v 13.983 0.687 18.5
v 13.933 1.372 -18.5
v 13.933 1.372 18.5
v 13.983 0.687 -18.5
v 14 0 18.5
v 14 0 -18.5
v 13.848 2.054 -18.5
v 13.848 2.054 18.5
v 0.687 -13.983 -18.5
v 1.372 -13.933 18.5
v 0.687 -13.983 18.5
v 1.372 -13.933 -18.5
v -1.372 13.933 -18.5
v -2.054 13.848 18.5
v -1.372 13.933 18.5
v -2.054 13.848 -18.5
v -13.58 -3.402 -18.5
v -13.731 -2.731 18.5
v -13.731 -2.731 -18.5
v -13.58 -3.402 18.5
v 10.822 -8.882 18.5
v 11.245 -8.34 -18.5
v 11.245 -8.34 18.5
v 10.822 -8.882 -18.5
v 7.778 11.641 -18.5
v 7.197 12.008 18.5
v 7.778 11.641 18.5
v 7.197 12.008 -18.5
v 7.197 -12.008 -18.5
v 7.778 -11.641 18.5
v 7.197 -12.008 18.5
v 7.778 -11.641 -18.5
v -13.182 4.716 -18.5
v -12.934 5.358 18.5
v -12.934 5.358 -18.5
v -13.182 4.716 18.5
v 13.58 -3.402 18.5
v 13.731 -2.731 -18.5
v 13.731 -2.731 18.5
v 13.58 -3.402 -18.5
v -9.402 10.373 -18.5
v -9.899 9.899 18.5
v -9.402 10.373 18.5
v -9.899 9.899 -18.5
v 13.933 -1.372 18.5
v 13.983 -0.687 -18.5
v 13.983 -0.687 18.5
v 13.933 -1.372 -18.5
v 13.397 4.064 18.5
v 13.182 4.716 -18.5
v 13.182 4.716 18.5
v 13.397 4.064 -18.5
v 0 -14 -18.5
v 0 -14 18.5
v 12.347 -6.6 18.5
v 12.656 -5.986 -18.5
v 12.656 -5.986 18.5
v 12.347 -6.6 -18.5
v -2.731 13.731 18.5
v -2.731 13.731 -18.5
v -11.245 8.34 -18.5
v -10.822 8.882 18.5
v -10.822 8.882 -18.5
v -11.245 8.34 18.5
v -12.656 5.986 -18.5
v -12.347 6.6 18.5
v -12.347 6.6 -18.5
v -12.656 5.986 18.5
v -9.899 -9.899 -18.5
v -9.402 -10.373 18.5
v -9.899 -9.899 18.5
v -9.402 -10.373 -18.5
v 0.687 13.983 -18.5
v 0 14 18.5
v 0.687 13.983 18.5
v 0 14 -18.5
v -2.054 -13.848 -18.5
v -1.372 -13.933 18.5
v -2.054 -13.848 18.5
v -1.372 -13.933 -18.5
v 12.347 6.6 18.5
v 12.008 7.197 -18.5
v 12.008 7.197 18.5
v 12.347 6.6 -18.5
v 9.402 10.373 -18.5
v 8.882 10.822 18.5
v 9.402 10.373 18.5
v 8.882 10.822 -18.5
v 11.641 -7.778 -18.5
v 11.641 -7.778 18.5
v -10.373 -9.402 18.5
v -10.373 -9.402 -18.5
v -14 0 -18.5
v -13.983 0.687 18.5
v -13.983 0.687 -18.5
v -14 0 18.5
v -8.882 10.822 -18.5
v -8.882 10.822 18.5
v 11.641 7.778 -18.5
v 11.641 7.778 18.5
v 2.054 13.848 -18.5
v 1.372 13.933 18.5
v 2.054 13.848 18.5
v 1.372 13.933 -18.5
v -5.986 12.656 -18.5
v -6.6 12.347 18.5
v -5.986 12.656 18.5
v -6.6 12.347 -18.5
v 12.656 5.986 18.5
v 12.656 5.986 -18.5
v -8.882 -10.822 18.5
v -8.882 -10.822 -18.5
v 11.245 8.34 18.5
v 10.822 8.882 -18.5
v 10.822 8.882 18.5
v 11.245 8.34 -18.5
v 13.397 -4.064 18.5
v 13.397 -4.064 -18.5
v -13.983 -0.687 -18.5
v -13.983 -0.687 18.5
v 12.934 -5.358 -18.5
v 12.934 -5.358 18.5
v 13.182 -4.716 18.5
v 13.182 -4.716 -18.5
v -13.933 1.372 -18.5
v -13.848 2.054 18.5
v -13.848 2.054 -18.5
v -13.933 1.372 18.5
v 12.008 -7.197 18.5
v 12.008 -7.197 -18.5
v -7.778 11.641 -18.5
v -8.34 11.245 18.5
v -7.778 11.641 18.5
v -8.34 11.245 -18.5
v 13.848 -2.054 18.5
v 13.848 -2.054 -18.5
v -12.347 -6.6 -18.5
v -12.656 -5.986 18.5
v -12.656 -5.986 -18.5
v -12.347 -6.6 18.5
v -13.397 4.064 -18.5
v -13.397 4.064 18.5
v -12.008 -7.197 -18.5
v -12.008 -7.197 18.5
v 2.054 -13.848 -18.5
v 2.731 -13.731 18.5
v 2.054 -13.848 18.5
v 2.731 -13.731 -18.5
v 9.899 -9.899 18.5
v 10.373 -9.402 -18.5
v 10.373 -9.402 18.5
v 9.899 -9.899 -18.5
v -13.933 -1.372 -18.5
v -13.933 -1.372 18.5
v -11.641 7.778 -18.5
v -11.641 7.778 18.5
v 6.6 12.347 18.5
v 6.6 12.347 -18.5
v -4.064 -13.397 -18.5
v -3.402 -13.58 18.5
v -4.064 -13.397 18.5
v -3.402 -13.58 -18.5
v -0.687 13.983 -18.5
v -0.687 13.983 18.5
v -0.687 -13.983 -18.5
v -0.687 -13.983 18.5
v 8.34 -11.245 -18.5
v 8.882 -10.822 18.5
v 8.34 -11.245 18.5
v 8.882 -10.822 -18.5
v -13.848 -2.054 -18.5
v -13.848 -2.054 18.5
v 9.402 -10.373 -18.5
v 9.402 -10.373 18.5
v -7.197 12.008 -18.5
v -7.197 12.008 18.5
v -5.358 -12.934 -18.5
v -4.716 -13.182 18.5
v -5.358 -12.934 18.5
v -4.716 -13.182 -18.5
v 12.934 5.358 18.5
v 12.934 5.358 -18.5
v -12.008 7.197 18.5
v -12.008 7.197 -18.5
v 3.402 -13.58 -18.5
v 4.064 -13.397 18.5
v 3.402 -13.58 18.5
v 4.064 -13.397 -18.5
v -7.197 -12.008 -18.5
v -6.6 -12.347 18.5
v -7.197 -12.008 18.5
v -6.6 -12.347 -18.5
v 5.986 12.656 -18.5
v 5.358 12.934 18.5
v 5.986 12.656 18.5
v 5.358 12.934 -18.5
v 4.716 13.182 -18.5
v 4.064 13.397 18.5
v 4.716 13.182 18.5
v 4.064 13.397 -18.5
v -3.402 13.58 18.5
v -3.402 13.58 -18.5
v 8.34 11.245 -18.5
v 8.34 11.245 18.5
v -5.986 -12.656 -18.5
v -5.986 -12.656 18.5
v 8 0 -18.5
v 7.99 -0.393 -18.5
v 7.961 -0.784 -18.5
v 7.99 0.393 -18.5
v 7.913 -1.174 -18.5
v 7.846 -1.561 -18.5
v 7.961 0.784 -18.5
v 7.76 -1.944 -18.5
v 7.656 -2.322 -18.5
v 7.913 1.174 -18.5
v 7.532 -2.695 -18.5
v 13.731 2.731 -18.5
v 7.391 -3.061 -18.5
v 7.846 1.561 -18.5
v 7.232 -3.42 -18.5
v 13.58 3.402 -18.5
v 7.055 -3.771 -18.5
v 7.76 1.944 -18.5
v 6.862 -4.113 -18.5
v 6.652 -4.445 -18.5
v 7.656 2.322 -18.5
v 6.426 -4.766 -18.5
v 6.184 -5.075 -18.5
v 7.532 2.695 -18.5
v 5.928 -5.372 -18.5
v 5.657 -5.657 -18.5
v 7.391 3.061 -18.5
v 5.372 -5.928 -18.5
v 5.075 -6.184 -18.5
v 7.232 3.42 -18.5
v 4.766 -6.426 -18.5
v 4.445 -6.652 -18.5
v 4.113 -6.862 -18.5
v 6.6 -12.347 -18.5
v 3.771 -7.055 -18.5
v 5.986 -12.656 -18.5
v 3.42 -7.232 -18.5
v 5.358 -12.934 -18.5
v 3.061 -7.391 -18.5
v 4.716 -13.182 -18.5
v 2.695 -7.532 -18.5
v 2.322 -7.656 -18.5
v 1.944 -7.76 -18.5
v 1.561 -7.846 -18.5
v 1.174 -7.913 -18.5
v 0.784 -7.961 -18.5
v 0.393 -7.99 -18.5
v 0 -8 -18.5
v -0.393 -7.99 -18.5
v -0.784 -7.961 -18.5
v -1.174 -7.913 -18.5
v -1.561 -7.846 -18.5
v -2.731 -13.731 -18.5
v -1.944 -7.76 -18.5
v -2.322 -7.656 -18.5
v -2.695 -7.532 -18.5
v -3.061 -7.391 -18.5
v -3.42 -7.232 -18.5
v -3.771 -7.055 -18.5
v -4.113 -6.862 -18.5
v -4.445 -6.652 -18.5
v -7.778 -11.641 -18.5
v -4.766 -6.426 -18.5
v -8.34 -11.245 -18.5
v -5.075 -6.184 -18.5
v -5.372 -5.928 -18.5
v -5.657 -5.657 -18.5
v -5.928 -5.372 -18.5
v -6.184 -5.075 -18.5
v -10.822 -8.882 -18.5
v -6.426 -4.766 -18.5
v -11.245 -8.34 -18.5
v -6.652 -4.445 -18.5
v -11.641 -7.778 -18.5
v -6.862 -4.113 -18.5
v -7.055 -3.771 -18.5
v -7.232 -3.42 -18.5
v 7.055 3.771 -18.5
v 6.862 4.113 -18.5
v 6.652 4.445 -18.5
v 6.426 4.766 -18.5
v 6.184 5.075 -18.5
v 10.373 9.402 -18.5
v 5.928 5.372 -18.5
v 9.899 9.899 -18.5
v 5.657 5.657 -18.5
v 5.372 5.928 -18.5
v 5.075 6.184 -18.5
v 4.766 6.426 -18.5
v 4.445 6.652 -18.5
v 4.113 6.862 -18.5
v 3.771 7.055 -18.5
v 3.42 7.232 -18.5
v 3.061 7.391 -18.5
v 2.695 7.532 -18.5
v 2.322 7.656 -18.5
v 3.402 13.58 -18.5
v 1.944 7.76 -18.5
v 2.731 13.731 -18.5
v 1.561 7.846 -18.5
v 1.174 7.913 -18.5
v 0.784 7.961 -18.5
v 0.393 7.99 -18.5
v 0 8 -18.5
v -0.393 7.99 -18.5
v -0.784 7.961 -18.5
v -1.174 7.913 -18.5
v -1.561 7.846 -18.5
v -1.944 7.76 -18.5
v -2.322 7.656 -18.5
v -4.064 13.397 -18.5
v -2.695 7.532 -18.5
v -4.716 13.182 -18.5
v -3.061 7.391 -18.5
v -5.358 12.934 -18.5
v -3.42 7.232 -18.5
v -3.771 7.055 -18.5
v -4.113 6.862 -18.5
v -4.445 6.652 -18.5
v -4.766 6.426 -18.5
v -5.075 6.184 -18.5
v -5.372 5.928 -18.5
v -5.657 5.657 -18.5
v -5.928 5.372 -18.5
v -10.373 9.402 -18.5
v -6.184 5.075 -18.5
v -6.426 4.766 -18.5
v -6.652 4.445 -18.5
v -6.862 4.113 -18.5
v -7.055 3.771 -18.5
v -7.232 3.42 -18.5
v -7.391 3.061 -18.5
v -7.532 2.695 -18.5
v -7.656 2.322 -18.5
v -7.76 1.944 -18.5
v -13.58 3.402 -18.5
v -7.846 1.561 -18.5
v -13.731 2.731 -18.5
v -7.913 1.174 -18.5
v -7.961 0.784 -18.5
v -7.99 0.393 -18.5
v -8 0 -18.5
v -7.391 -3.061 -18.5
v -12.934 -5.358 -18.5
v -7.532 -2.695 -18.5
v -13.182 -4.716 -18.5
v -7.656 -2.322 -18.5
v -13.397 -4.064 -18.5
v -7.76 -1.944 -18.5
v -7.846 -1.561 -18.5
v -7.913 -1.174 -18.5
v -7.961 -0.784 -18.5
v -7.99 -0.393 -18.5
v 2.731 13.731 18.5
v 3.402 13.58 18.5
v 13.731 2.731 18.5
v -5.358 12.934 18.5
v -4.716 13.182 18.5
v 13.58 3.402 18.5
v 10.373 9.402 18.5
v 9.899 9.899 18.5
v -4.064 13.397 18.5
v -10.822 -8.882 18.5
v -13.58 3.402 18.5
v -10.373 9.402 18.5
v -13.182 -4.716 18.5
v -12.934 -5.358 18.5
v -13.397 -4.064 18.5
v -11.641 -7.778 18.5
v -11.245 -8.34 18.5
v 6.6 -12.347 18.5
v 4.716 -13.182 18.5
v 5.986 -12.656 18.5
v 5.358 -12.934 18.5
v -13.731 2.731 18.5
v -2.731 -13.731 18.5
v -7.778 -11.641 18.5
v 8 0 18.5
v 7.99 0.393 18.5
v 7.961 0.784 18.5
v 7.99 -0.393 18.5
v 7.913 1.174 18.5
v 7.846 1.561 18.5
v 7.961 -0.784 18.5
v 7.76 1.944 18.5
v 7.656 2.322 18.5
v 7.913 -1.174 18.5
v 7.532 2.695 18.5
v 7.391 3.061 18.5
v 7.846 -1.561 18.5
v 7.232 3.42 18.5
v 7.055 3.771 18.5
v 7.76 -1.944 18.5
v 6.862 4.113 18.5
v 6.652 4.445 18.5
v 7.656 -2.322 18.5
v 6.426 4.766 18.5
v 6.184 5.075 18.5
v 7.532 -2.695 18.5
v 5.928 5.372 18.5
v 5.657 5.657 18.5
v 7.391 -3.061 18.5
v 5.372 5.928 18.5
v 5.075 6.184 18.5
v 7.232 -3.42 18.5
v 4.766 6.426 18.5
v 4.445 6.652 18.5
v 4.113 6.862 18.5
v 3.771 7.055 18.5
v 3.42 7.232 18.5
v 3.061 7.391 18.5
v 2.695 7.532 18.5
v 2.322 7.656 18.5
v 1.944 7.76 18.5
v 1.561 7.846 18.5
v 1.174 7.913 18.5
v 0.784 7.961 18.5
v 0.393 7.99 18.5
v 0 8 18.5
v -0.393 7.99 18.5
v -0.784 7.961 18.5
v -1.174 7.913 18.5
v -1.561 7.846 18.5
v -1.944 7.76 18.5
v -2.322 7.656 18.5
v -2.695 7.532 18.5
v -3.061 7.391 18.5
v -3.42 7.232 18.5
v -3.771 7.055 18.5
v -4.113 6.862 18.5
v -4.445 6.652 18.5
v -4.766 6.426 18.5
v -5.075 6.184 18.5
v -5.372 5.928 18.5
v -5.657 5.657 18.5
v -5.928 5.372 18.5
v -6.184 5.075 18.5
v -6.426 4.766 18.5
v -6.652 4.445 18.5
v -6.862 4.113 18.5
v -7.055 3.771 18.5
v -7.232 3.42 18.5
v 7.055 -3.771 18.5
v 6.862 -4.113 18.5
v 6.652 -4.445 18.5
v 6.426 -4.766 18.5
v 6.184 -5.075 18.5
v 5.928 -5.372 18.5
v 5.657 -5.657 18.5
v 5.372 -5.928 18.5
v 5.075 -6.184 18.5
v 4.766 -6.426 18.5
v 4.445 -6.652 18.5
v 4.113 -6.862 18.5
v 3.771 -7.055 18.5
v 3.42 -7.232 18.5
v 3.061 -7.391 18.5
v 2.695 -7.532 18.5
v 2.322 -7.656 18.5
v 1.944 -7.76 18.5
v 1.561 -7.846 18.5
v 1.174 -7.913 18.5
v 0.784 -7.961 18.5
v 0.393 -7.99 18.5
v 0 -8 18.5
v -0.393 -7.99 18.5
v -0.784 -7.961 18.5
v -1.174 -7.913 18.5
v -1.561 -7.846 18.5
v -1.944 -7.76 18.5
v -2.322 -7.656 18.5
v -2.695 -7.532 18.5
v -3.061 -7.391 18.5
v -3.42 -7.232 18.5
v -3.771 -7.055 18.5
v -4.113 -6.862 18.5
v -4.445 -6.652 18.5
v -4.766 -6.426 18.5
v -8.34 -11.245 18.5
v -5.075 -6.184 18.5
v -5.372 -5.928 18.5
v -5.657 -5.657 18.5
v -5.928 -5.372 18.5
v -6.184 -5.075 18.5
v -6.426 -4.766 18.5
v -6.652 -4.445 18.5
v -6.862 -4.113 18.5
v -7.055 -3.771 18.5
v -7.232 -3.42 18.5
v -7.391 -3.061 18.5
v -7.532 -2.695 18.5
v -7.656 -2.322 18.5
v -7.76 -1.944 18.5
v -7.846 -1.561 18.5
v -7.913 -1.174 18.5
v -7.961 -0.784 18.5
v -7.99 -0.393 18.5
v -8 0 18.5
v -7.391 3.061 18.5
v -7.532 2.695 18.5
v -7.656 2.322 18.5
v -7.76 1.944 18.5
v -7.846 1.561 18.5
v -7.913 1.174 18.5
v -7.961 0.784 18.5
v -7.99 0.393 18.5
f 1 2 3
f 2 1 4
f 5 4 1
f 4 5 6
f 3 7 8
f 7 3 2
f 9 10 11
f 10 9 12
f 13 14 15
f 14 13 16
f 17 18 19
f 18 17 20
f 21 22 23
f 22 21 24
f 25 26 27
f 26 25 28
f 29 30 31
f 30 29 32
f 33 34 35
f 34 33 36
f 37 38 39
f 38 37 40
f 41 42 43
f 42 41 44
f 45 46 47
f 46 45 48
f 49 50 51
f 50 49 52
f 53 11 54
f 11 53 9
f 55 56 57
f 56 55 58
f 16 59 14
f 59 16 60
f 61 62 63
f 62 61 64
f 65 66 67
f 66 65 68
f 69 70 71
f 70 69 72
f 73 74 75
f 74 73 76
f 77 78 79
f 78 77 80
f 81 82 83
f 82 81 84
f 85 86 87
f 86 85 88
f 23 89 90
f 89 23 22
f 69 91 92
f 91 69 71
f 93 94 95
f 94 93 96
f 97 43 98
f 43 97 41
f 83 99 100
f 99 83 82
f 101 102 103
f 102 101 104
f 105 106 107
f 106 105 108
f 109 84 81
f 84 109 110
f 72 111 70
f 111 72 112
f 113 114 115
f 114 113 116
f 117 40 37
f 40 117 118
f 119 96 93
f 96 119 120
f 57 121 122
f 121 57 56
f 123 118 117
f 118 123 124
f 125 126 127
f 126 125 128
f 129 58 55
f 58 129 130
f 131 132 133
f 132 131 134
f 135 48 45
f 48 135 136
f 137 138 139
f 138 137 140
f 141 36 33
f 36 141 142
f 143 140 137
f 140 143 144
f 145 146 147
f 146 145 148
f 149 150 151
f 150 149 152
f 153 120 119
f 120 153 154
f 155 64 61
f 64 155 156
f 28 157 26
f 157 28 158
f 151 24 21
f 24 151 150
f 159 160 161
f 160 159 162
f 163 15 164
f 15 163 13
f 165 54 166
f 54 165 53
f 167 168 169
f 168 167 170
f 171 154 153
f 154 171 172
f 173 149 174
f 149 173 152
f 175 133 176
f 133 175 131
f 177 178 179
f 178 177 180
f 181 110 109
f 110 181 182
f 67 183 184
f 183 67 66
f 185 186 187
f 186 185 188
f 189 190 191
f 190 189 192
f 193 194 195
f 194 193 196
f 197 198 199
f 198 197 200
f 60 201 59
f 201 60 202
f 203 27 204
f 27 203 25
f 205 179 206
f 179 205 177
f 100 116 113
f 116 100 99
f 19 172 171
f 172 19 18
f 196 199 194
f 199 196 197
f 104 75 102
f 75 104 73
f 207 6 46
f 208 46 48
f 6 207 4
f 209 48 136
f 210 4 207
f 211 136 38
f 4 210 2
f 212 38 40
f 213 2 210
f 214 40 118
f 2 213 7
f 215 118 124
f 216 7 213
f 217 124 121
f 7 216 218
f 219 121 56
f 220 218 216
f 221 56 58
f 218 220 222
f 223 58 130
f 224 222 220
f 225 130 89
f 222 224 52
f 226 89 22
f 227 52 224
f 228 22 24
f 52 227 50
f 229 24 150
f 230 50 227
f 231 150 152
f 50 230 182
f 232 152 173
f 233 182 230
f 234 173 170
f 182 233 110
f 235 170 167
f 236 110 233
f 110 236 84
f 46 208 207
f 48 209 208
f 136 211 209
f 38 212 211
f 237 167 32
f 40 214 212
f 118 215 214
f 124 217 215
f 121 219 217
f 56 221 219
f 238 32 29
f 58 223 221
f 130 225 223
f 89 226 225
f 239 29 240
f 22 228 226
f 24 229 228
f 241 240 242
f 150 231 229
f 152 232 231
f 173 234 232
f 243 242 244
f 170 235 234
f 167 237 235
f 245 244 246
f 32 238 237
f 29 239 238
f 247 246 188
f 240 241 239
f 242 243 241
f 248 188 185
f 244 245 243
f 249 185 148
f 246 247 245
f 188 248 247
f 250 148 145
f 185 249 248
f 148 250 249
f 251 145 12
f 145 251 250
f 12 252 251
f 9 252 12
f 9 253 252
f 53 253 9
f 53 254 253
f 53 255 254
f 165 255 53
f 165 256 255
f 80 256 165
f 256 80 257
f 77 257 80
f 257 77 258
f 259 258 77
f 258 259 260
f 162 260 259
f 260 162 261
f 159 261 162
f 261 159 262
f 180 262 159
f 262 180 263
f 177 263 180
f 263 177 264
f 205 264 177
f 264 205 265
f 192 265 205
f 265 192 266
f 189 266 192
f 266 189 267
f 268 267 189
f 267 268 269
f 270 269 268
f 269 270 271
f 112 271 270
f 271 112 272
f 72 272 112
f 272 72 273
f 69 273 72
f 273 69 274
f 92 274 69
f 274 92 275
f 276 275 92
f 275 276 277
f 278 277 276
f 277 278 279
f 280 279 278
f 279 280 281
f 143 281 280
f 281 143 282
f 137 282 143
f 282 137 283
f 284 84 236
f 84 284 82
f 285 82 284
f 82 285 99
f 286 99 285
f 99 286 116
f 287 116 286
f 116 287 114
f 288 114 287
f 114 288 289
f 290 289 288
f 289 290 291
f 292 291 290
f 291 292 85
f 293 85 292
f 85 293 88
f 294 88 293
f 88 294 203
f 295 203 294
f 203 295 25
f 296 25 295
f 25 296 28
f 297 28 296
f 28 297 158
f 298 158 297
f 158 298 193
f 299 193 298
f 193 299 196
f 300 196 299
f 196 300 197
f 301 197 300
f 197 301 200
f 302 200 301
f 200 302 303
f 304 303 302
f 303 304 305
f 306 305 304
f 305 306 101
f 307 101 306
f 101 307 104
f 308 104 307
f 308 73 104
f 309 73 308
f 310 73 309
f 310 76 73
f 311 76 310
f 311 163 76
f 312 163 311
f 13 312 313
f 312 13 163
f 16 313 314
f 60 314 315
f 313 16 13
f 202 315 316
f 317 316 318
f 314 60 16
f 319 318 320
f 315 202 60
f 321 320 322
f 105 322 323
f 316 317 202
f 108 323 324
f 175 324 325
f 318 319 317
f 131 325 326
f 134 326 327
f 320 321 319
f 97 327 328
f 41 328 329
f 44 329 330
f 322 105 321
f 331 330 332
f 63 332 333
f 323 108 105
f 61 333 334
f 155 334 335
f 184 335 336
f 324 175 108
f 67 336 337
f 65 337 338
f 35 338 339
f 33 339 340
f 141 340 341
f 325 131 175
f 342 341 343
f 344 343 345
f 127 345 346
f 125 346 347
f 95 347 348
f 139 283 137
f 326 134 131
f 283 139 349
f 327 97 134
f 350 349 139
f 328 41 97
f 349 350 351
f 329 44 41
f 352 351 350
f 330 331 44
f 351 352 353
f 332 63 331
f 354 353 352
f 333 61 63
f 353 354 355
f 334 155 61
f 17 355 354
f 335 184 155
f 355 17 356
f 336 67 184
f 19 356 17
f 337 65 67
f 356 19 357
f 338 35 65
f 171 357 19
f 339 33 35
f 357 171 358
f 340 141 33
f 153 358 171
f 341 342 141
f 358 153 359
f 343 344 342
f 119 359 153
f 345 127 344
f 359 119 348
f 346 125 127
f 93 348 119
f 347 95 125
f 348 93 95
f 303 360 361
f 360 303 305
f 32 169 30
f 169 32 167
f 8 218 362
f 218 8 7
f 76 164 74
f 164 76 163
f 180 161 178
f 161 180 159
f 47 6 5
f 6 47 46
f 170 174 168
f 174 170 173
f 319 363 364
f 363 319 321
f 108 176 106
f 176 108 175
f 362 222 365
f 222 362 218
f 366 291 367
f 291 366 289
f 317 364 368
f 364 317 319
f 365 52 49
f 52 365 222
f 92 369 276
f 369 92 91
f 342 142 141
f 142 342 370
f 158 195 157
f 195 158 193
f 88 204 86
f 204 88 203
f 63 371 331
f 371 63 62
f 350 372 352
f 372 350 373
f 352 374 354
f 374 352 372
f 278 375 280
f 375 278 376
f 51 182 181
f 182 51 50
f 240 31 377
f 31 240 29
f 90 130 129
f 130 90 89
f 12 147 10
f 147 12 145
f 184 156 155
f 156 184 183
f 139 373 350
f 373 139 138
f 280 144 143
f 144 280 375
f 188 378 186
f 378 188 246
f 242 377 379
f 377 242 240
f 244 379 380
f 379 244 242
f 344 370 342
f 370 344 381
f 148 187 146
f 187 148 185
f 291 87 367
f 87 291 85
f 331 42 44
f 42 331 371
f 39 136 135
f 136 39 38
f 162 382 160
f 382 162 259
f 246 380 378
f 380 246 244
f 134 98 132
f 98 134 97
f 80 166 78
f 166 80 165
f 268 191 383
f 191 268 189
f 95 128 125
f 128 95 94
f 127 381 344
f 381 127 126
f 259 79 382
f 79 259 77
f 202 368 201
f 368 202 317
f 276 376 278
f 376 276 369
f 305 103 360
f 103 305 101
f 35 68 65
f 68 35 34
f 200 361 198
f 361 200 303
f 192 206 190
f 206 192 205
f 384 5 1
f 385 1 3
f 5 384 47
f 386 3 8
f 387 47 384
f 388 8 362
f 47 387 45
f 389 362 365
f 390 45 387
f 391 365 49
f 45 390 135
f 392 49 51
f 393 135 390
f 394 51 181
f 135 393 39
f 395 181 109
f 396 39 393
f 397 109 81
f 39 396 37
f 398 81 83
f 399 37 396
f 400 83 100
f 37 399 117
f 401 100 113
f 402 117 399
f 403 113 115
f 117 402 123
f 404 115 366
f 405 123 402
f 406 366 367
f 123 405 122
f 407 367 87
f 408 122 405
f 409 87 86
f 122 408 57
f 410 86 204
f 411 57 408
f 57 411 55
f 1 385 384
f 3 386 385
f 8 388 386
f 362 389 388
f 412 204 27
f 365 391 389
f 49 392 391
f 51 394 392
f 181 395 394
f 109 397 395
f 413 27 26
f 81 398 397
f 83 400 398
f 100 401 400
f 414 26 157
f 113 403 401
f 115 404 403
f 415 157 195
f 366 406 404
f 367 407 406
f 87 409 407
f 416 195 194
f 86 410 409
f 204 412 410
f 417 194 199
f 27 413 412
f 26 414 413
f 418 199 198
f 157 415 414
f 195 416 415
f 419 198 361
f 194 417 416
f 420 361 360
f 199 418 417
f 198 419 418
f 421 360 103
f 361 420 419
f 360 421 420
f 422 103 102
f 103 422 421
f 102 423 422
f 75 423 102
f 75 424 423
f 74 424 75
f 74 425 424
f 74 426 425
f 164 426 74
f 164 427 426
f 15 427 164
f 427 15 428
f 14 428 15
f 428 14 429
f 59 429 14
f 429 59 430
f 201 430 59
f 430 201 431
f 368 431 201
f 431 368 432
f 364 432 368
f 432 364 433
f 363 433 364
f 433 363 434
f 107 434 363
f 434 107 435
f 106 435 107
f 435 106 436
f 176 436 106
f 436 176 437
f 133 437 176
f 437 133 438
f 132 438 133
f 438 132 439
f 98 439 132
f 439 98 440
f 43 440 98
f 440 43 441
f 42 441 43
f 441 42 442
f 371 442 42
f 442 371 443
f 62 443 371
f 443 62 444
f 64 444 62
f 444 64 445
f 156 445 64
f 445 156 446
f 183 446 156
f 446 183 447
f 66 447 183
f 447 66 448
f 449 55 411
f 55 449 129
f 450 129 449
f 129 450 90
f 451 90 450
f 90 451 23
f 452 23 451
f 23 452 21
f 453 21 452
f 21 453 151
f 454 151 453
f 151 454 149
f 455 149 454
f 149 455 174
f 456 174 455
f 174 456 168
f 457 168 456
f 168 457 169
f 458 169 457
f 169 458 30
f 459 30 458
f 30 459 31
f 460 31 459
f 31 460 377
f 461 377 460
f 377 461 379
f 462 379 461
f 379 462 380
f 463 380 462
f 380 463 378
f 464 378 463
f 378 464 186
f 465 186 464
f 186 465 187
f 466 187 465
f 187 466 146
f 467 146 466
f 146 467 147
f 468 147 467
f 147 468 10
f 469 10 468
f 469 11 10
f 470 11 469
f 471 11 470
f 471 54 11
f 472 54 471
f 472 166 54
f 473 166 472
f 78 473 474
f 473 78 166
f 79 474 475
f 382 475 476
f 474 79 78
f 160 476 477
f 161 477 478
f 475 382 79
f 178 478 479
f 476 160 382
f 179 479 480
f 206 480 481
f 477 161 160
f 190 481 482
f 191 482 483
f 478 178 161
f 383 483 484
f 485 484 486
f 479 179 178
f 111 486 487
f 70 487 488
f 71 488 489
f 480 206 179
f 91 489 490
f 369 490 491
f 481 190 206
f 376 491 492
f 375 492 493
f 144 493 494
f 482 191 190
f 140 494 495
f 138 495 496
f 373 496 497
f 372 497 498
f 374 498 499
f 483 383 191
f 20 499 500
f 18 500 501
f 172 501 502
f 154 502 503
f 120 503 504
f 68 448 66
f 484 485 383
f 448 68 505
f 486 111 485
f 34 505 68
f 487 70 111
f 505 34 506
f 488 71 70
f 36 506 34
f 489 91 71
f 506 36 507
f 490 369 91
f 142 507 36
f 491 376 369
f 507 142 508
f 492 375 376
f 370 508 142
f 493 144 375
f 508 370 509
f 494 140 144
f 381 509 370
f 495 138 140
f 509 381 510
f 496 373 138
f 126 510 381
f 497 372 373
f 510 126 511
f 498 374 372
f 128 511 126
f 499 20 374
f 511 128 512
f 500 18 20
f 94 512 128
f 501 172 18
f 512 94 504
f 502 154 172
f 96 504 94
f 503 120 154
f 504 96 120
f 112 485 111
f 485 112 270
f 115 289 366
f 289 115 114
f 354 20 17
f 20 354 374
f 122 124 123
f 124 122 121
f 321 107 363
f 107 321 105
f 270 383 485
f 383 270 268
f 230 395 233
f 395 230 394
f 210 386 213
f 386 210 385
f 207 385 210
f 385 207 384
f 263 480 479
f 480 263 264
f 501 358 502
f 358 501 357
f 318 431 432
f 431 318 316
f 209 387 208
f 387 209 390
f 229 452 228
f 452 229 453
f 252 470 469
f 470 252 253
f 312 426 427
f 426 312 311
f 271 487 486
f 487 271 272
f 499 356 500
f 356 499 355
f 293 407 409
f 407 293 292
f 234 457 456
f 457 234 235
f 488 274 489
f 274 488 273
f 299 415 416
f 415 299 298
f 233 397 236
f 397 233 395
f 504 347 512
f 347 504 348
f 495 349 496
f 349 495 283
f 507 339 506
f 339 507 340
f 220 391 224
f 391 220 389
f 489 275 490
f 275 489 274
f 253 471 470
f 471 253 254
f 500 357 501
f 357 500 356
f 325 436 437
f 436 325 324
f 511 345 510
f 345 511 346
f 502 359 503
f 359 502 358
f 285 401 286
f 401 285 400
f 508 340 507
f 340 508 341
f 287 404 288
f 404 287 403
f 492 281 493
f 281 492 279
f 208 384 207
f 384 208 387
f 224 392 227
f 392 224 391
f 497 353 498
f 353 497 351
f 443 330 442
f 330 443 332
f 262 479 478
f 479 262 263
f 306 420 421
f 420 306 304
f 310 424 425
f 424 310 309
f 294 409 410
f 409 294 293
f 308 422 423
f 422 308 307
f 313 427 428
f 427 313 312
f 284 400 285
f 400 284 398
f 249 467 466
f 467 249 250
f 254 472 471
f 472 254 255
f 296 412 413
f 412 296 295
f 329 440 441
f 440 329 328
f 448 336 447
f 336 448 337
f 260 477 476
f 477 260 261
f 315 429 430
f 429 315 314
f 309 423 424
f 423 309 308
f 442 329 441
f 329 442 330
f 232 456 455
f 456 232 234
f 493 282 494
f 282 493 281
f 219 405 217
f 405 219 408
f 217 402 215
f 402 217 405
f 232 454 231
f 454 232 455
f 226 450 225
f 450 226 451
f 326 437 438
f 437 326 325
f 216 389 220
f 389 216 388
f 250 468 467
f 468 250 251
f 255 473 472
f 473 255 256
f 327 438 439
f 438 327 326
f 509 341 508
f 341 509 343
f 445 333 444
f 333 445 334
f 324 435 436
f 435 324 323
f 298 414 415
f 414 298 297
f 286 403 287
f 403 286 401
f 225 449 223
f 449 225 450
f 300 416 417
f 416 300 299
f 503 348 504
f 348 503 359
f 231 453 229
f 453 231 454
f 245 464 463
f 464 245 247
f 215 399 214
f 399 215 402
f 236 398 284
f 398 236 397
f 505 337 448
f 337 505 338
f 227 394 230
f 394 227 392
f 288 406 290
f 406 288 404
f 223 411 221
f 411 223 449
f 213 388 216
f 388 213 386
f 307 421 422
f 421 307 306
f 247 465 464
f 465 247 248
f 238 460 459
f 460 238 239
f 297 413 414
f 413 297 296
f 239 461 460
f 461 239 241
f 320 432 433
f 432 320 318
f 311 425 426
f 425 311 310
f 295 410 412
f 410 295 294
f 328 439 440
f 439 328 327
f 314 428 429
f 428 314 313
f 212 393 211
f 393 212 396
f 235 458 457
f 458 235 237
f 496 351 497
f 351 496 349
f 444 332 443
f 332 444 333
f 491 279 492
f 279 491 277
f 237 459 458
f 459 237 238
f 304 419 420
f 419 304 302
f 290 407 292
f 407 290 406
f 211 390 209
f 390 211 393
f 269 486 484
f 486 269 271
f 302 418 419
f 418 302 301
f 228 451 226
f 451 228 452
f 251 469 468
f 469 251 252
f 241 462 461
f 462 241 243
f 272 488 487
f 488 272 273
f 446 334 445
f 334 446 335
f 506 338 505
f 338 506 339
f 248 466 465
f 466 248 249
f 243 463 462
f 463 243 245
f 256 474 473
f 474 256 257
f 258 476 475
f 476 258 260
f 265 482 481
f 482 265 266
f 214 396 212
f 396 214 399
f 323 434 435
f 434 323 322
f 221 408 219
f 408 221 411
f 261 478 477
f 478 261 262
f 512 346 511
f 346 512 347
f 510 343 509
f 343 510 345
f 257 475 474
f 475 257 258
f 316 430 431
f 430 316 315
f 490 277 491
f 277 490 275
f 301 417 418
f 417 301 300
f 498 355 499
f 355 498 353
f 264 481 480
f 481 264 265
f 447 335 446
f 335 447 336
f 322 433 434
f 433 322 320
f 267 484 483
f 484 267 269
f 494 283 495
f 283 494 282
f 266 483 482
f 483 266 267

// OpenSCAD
$fn = 128;

// Target dimensions (mm)
bore_diameter  = 16.0;   // ID
outer_diameter = 28.0;   // OD
length         = 37.0;   // overall length

// Small epsilon to ensure clean boolean cuts
eps = 0.02;

module linear_bearing_16_28_37() {
    difference() {
        // Outer sleeve
        cylinder(d=outer_diameter, h=length, center=true);

        // Through bore (make slightly longer so it always cuts fully)
        cylinder(d=bore_diameter, h=length + 2*eps, center=true);
    }
}

// ONE connected solid: just the bearing sleeve (no extra shaft/pin/screw/washer)
linear_bearing_16_28_37();
